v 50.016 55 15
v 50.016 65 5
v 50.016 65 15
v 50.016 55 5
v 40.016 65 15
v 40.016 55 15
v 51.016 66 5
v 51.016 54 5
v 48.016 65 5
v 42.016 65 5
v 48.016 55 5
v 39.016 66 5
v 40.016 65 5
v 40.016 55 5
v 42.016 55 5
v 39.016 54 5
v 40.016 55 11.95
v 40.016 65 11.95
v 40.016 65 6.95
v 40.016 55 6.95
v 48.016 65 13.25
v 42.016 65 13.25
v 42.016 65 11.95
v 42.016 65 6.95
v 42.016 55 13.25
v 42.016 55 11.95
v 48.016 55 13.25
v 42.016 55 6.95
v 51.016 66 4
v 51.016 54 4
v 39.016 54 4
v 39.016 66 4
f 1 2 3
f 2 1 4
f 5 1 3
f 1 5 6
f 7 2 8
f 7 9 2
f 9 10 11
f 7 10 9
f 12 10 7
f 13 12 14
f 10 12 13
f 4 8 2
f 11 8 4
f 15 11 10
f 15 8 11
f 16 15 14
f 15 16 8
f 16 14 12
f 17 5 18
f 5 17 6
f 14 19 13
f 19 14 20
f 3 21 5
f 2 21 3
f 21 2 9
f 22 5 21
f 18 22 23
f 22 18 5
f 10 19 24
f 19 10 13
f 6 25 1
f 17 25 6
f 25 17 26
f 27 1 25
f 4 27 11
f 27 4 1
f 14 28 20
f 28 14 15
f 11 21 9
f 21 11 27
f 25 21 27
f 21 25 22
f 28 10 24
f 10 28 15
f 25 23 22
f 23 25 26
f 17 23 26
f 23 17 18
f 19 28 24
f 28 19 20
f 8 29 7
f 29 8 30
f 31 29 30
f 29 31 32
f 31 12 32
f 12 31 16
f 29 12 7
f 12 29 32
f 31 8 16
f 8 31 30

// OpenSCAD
//Headphone Stand
//By Matthew Croft
//v.5 January 20,2019

//This project is designed to be a wall mount for a pair of headphones

//parameters-------------------------------------------------
cm=10;
screwd=0.2778125; //7 wood screw (mm)
screwhd=0.79375;
//render-----------------------------------------------------
stand();
!wire();

//modules----------------------------------------------------
module stand() {
//bottom
  difference(){
    translate([0,0,cm*0.2]) cube([cm*12,cm*20,cm*0.5], center=true);
//smoothing base
    translate([0,cm*12.8,-cm*2.5]) rotate([-45,0,0]) cube([cm*14,cm*10,cm*0.5], center=true); 
    translate([0,cm*-12.8,-cm*2.5]) rotate([45,0,0]) cube([cm*14,cm*10,cm*0.5], center=true); 
    translate([cm*7.3,0,-cm]) rotate([0,45,0]) cube([cm*5,cm*21,cm*0.5], center=true); 
    translate([cm*-7.3,0,-cm]) rotate([0,-45,0]) cube([cm*5,cm*21,cm*0.5], center=true); 
//Screw Holes
    translate([cm*14/4,-cm*12/2,-1])cylinder(h=cm*4,d=screwd*cm,center=true);
    translate([-cm*7,-cm*12/2,-1])cylinder(h=cm*4,d=screwd*cm,center=true);
    translate([0,cm*12/2,-1])cylinder(h=cm*4,d=screwd*cm,center=true);
//screw head
    translate([cm*14/4,-cm*12/2,0.5+screwhd*cm/2])sphere(d=screwhd*cm);
    translate([0,cm*12/2,0.5+screwhd*cm/2])sphere(d=screwhd*cm);
    translate([-cm*14/4,-cm*12/2,0.5+screwhd*cm/2])sphere(d=screwhd*cm);
}
//holder
  translate([0,cm*11/4,0]) {
    difference(){
        translate([0,0,cm*7.5])cylinder(h=cm*15,d=cm*11,center=true);
        translate([0,cm*.5,cm*7.5-cm])cylinder(h=cm*16,d=cm*10,center=true);
        translate([0,cm*7.5,cm*7+0.45*cm-cm])cube([cm*14,cm*15,cm*20], center=true);
}
}
}
//wire holder
module wire() {
difference(){    
    translate([cm*14/3.11,cm*12/2,cm*0.5*2]) cube([cm*1,cm*1,cm*1], center=true);
    translate([cm*14/3.11,cm*12/2,cm*0.5*1.75]) cube([cm*0.6,cm*1.5,cm*0.9], center=true);
    translate([cm*14/3.5,cm*12/2,cm*0.5*1.89]) cube([cm*0.6,cm*1.5,cm*0.5], center=true);
}
difference(){
    translate([cm*14/3.11,cm*12/2,cm*0.45]) cube([cm+2,cm+2,cm*0.1], center=true); 
}
}
